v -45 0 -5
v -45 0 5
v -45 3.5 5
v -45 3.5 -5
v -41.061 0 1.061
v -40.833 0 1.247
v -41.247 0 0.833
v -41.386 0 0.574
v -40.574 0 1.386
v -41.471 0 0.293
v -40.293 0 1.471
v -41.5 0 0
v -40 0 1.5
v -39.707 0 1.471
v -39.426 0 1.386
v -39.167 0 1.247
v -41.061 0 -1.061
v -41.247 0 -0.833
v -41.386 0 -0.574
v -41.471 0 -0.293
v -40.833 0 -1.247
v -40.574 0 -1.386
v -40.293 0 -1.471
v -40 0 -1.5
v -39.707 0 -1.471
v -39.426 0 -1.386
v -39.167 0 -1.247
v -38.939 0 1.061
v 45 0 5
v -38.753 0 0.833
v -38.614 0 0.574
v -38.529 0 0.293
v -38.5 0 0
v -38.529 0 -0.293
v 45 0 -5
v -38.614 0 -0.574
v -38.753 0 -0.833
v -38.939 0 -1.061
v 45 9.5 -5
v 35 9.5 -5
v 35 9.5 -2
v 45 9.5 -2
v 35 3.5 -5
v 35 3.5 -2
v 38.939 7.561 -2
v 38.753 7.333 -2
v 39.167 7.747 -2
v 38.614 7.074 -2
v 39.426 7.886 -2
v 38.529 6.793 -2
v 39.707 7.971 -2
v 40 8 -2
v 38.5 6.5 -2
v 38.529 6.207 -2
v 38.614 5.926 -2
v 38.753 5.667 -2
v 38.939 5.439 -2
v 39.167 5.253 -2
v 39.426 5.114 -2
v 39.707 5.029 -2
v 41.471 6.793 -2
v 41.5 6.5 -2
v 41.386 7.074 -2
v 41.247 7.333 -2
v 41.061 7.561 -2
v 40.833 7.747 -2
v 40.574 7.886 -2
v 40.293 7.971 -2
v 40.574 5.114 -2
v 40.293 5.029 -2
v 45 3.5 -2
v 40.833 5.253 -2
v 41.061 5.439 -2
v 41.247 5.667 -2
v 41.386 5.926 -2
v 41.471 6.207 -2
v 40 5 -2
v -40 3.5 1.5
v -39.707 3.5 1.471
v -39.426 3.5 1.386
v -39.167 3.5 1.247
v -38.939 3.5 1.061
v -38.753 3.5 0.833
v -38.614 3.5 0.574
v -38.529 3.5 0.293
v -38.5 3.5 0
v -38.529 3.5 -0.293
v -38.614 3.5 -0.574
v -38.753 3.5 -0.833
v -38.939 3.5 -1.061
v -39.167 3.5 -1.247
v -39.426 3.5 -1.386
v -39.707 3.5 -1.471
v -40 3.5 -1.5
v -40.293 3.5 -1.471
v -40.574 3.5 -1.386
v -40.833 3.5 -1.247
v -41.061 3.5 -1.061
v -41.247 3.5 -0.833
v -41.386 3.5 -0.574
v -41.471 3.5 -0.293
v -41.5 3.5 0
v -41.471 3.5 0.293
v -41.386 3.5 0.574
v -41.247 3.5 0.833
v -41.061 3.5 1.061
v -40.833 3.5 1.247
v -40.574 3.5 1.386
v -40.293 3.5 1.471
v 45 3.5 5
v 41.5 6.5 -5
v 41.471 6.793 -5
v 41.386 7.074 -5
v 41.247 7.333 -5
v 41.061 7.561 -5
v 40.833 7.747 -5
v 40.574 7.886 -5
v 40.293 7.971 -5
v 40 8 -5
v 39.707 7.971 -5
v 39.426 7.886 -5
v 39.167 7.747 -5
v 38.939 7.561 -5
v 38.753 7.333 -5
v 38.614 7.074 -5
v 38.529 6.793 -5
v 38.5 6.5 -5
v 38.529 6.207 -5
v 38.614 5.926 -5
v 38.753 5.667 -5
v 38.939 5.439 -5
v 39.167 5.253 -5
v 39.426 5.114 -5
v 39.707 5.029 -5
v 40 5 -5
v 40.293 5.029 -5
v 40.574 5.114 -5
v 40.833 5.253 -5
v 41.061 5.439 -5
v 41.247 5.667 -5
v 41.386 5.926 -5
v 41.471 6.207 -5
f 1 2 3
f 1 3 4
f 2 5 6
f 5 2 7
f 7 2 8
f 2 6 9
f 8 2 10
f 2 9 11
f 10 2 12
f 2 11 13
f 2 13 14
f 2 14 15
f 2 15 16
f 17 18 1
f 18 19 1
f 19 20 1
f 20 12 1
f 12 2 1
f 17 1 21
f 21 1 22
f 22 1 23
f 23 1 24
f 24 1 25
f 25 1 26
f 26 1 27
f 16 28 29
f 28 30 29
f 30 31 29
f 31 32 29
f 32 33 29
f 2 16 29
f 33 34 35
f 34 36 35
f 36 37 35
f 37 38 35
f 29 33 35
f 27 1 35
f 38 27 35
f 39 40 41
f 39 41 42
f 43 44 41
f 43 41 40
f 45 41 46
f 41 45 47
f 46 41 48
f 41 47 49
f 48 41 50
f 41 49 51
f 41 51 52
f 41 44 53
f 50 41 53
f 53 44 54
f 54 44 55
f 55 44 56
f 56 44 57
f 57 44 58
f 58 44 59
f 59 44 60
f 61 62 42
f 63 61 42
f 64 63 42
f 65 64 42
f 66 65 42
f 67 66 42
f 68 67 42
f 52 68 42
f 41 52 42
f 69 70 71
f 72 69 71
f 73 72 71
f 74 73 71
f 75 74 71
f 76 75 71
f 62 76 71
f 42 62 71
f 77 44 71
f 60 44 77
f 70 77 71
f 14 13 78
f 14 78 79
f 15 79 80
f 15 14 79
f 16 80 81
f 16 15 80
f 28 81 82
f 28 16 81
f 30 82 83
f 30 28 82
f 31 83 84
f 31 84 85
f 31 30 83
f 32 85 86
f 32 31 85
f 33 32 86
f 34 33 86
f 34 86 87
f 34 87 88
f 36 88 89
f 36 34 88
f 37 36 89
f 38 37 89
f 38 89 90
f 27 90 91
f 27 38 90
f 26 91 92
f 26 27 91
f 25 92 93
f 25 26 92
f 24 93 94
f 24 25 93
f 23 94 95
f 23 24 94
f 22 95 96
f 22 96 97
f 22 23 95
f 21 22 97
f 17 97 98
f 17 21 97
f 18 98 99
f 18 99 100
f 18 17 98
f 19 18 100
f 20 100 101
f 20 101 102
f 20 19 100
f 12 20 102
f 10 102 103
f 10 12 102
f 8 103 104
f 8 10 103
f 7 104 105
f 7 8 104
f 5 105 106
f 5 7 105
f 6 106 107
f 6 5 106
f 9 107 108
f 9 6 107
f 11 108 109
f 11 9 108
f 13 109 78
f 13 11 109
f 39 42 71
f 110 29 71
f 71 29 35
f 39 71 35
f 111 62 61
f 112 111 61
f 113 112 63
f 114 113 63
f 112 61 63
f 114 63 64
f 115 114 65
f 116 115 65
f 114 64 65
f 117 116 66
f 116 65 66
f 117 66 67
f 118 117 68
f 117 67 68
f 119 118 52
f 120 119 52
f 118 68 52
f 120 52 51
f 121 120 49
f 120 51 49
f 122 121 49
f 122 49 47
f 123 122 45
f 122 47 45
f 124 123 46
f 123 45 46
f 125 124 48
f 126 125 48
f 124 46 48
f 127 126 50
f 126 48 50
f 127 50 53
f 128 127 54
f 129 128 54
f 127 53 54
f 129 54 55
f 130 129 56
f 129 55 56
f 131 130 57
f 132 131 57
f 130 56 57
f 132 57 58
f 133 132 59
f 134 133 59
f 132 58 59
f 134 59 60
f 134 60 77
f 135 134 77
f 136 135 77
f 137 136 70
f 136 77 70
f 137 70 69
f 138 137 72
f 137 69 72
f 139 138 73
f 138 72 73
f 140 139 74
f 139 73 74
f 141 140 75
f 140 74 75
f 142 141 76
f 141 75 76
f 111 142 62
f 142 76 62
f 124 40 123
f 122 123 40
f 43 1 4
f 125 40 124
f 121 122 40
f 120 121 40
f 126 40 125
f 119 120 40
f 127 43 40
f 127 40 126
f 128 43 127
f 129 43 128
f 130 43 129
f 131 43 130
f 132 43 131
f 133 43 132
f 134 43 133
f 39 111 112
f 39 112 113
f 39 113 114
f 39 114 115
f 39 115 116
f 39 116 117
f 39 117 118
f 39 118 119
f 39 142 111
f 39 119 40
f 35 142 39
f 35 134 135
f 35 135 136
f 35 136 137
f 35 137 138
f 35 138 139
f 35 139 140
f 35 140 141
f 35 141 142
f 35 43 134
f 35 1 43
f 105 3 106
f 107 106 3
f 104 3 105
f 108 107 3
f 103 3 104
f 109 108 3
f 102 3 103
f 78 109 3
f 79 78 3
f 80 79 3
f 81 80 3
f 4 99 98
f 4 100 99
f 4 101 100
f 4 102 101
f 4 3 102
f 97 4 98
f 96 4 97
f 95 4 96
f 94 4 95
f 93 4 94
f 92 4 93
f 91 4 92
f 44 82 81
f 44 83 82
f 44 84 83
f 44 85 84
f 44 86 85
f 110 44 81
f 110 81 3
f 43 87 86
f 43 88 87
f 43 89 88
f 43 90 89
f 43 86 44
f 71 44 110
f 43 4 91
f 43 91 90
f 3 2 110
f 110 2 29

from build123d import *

# Parameters (mm, degrees)
SKETCH1_W           = 90
SKETCH1_H           = 10
SKETCH1_R           = 1.5
BOSS_EXTRUDE1_DEPTH = 3.5
SKETCH2_W           = 10
SKETCH2_H           = 3
BOSS_EXTRUDE2_DEPTH = 6
SKETCH3_R           = 1.5
CUT_EXTRUDE1_DEPTH  = 3


with BuildPart() as part:
    # Sketch1 → Boss-Extrude1 (new body)
    with BuildSketch(Plane(origin=(0, 0, 0), x_dir=(1, 0, 0), z_dir=(0, 1, 0))):
        Rectangle(SKETCH1_W, SKETCH1_H)
        with Locations(Location((-40, 0, 0), (0, 0, 270))):
            Circle(SKETCH1_R, mode=Mode.SUBTRACT)
    extrude(amount=BOSS_EXTRUDE1_DEPTH)

    # Sketch2 → Boss-Extrude2 (add)
    with BuildSketch(Plane(origin=(0, 3.5, 0), x_dir=(1, 0, 0), z_dir=(0, 1, 0))):
        with Locations((40, 3.5)):
            Rectangle(SKETCH2_W, SKETCH2_H)
    extrude(amount=BOSS_EXTRUDE2_DEPTH)

    # Sketch3 → Cut-Extrude1 (cut)
    with BuildSketch(Plane.XY.offset(-2)):
        with Locations((40, 6.5)):
            Circle(SKETCH3_R)
    extrude(amount=-CUT_EXTRUDE1_DEPTH, mode=Mode.SUBTRACT)


solid = part.part
